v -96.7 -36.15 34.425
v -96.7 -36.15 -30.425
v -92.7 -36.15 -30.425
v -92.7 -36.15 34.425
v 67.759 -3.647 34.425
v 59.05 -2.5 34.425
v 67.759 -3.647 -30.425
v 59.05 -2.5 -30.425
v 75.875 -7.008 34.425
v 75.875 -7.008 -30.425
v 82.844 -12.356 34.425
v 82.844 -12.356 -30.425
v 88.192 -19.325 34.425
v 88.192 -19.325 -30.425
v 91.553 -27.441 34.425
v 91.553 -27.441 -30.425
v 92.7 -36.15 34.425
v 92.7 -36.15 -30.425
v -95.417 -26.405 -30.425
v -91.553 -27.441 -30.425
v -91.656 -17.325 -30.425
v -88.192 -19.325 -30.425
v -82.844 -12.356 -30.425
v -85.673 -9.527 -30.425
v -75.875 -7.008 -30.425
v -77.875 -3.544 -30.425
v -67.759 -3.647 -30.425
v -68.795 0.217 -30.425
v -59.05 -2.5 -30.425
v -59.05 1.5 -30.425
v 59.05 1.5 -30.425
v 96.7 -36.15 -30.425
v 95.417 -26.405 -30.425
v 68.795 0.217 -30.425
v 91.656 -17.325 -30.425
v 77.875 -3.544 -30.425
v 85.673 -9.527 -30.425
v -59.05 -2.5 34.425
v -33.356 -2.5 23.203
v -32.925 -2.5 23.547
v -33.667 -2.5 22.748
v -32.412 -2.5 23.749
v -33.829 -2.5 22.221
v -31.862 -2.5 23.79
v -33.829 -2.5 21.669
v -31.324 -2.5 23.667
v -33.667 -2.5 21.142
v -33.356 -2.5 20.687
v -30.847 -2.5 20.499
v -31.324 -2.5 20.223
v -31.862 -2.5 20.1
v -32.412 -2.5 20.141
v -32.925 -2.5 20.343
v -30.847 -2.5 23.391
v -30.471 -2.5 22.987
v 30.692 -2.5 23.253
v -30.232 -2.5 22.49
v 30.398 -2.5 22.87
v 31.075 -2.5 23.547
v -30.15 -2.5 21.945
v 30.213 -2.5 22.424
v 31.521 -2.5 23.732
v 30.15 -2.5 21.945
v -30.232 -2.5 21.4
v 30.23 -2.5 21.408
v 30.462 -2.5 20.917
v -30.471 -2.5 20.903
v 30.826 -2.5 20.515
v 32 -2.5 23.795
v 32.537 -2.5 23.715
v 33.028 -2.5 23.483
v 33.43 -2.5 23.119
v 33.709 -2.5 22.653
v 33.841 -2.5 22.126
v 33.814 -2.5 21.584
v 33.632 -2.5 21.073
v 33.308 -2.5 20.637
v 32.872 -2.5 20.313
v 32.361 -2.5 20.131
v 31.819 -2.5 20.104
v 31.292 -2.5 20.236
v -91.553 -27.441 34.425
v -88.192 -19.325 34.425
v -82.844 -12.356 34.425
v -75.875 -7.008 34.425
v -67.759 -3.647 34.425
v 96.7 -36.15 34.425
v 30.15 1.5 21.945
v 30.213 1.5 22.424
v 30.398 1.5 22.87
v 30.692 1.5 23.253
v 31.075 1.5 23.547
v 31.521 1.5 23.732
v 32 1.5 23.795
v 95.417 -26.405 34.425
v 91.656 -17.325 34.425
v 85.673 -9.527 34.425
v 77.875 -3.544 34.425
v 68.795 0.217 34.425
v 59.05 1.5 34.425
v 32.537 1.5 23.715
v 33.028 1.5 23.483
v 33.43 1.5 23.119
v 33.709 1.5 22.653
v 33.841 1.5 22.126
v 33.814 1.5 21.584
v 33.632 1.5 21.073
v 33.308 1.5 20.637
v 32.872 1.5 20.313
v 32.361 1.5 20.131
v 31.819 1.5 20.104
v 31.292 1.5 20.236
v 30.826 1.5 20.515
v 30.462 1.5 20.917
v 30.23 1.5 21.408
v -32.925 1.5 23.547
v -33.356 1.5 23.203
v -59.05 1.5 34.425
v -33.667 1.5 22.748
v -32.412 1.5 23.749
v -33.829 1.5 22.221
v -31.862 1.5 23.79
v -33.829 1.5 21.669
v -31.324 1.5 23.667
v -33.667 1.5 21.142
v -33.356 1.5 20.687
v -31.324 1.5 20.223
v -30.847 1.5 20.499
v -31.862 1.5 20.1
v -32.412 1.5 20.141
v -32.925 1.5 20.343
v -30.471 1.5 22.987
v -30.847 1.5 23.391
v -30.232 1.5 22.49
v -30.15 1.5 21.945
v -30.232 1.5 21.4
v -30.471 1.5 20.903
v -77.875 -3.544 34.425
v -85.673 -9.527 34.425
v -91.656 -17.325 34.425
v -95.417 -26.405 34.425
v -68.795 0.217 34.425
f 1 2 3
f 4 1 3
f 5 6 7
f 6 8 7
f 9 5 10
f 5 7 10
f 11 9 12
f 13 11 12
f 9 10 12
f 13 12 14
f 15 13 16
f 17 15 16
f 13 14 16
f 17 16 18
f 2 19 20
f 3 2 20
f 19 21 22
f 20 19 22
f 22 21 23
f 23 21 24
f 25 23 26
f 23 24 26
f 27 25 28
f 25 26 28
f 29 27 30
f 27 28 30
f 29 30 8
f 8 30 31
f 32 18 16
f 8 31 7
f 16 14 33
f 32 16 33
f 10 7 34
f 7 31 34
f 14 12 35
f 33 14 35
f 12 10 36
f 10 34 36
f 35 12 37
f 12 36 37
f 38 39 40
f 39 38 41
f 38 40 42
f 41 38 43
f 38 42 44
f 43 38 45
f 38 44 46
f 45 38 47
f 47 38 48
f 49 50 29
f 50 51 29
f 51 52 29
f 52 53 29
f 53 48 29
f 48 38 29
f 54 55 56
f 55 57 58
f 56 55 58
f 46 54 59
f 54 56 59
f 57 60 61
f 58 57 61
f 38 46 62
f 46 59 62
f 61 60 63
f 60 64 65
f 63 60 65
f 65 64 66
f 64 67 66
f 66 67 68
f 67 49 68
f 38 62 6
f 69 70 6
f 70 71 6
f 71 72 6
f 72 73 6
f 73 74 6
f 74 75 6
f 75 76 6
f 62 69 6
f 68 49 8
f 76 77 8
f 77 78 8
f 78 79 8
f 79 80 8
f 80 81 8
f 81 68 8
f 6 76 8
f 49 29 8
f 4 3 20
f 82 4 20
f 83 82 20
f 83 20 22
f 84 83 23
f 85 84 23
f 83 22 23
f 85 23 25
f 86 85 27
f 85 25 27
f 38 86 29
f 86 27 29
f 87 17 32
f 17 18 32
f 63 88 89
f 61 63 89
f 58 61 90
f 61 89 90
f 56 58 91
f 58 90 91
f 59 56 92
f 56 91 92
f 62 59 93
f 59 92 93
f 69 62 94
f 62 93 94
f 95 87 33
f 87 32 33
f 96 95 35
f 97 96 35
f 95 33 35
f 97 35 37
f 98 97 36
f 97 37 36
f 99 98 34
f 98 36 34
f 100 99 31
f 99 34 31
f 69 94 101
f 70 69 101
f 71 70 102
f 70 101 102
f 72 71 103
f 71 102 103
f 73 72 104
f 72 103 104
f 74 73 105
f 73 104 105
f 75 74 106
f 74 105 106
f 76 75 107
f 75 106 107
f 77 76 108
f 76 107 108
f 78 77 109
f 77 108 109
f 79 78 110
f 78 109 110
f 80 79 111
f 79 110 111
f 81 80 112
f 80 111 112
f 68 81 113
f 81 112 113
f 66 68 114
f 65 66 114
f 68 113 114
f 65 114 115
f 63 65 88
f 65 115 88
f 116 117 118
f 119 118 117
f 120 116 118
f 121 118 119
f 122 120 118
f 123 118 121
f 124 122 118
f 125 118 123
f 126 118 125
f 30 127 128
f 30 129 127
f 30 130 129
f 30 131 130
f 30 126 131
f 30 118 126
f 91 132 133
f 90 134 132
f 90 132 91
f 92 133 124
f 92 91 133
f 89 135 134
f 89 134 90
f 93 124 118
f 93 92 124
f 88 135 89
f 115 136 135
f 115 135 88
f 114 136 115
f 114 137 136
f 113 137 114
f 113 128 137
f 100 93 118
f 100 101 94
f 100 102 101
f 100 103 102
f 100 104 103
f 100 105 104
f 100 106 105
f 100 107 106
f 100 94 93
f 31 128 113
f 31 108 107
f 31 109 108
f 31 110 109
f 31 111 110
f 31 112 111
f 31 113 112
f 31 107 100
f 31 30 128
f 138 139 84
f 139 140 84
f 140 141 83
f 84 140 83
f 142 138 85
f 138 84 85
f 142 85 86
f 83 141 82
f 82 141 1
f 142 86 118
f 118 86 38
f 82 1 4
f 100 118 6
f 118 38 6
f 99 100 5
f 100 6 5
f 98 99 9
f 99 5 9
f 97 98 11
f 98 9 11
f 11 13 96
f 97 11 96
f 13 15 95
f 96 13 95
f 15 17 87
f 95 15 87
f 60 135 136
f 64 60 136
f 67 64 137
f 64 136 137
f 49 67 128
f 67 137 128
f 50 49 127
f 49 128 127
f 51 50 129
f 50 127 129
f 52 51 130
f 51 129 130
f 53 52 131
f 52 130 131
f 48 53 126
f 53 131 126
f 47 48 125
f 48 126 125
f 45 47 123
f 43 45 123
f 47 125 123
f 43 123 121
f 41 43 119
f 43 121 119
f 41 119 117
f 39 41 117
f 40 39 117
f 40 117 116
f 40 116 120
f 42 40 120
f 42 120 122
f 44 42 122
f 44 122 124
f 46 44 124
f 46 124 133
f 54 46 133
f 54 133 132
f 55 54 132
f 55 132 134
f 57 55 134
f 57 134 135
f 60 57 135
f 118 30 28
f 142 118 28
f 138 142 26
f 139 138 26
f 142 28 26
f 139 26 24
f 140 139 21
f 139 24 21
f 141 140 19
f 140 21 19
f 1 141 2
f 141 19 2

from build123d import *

# Parameters (mm, degrees)
F0_W     = 118.1
F0_H     = 60.85
F1_DEPTH = 2.5
F4_DEPTH = 32.925
F5_DEPTH = 30.425
F6_DEPTH = 2.5
F7_DEPTH = 1.5
F9_DEPTH = 25


# Not quite as in the source:
# - a feature of the source that left no trace in its solid (it failed there, or was rolled back) is left out
# - a pattern or mirror of a feature is missing from the dataset's text; its kind, count and spacing are read off the source's solid


with BuildPart() as f1:
    # F0 (on Front) → F1 (new body)
    with BuildSketch(Plane.XZ):
        Rectangle(F0_W, F0_H)
    extrude(amount=F1_DEPTH)

    # F1_copies: F1 across plane


with BuildPart() as f1_1:
    add(f1.part)
    add(f1.part.mirror(Plane.ZX.offset(-0.5)))

    # F3 (on Top) → F4 (join)
    with BuildSketch(Plane.XY):
        with BuildLine():
            ThreePointArc((-92.7, -36.15), (-82.8441431869, -12.3558568131), (-59.05, -2.5))
            Line((-59.05, -2.5), (-59.05, 0))
            Line((-59.05, 0), (-59.05, 1.5))
            ThreePointArc((-59.05, 1.5), (-85.6725703117, -9.5274296883), (-96.7, -36.15))
            Line((-96.7, -36.15), (-95.2, -36.15))
            Line((-95.2, -36.15), (-92.7, -36.15))
        make_face()
        with BuildLine():
            ThreePointArc((59.05, -2.5), (82.8441431869, -12.3558568131), (92.7, -36.15))
            Line((92.7, -36.15), (95.2, -36.15))
            Line((95.2, -36.15), (96.7, -36.15))
            ThreePointArc((96.7, -36.15), (85.6725703117, -9.5274296883), (59.05, 1.5))
            Line((59.05, 1.5), (59.05, 0))
            Line((59.05, 0), (59.05, -2.5))
        make_face()
    extrude(amount=F4_DEPTH)

    # F3 (on Top) → F5 (join)
    with BuildSketch(Plane.XY):
        with BuildLine():
            ThreePointArc((-92.7, -36.15), (-82.8441431869, -12.3558568131), (-59.05, -2.5))
            Line((-59.05, -2.5), (-59.05, 0))
            Line((-59.05, 0), (-59.05, 1.5))
            ThreePointArc((-59.05, 1.5), (-85.6725703117, -9.5274296883), (-96.7, -36.15))
            Line((-96.7, -36.15), (-95.2, -36.15))
            Line((-95.2, -36.15), (-92.7, -36.15))
        make_face()
        with BuildLine():
            ThreePointArc((59.05, -2.5), (82.8441431869, -12.3558568131), (92.7, -36.15))
            Line((92.7, -36.15), (95.2, -36.15))
            Line((95.2, -36.15), (96.7, -36.15))
            ThreePointArc((96.7, -36.15), (85.6725703117, -9.5274296883), (59.05, 1.5))
            Line((59.05, 1.5), (59.05, 0))
            Line((59.05, 0), (59.05, -2.5))
        make_face()
    extrude(amount=-F5_DEPTH)

    # F6 (add): a face of the model
    f6_faces = [f1_1.faces().sort_by_distance(p)[0] for p in [
        (0, -0.5, 30.425),
    ]]
    extrude(f6_faces, amount=F6_DEPTH)

    # F7 (add): a face of the model
    f7_faces = [f1_1.faces().sort_by_distance(p)[0] for p in [
        (84.2373603721, -10.9626396279, 32.925),
    ]]
    extrude(f7_faces, amount=F7_DEPTH)

    # F8 (on face) → F9 (cut)
    with BuildSketch(Plane(origin=(0, 1.5, 0), x_dir=(-1, 0, 0), z_dir=(0, 1, 0))):
        with BuildLine():
            ThreePointArc((33.85, 21.945), (32, 23.795), (30.15, 21.945))
            ThreePointArc((30.15, 21.945), (32, 20.095), (33.85, 21.945))
        make_face()
        with BuildLine():
            ThreePointArc((-32, 23.795), (-33.3081475452, 20.6368524548), (-30.15, 21.945))
            ThreePointArc((-30.15, 21.945), (-30.6918524548, 23.2531475452), (-32, 23.795))
        make_face()
    extrude(amount=-F9_DEPTH, mode=Mode.SUBTRACT)


solid = f1_1.part
